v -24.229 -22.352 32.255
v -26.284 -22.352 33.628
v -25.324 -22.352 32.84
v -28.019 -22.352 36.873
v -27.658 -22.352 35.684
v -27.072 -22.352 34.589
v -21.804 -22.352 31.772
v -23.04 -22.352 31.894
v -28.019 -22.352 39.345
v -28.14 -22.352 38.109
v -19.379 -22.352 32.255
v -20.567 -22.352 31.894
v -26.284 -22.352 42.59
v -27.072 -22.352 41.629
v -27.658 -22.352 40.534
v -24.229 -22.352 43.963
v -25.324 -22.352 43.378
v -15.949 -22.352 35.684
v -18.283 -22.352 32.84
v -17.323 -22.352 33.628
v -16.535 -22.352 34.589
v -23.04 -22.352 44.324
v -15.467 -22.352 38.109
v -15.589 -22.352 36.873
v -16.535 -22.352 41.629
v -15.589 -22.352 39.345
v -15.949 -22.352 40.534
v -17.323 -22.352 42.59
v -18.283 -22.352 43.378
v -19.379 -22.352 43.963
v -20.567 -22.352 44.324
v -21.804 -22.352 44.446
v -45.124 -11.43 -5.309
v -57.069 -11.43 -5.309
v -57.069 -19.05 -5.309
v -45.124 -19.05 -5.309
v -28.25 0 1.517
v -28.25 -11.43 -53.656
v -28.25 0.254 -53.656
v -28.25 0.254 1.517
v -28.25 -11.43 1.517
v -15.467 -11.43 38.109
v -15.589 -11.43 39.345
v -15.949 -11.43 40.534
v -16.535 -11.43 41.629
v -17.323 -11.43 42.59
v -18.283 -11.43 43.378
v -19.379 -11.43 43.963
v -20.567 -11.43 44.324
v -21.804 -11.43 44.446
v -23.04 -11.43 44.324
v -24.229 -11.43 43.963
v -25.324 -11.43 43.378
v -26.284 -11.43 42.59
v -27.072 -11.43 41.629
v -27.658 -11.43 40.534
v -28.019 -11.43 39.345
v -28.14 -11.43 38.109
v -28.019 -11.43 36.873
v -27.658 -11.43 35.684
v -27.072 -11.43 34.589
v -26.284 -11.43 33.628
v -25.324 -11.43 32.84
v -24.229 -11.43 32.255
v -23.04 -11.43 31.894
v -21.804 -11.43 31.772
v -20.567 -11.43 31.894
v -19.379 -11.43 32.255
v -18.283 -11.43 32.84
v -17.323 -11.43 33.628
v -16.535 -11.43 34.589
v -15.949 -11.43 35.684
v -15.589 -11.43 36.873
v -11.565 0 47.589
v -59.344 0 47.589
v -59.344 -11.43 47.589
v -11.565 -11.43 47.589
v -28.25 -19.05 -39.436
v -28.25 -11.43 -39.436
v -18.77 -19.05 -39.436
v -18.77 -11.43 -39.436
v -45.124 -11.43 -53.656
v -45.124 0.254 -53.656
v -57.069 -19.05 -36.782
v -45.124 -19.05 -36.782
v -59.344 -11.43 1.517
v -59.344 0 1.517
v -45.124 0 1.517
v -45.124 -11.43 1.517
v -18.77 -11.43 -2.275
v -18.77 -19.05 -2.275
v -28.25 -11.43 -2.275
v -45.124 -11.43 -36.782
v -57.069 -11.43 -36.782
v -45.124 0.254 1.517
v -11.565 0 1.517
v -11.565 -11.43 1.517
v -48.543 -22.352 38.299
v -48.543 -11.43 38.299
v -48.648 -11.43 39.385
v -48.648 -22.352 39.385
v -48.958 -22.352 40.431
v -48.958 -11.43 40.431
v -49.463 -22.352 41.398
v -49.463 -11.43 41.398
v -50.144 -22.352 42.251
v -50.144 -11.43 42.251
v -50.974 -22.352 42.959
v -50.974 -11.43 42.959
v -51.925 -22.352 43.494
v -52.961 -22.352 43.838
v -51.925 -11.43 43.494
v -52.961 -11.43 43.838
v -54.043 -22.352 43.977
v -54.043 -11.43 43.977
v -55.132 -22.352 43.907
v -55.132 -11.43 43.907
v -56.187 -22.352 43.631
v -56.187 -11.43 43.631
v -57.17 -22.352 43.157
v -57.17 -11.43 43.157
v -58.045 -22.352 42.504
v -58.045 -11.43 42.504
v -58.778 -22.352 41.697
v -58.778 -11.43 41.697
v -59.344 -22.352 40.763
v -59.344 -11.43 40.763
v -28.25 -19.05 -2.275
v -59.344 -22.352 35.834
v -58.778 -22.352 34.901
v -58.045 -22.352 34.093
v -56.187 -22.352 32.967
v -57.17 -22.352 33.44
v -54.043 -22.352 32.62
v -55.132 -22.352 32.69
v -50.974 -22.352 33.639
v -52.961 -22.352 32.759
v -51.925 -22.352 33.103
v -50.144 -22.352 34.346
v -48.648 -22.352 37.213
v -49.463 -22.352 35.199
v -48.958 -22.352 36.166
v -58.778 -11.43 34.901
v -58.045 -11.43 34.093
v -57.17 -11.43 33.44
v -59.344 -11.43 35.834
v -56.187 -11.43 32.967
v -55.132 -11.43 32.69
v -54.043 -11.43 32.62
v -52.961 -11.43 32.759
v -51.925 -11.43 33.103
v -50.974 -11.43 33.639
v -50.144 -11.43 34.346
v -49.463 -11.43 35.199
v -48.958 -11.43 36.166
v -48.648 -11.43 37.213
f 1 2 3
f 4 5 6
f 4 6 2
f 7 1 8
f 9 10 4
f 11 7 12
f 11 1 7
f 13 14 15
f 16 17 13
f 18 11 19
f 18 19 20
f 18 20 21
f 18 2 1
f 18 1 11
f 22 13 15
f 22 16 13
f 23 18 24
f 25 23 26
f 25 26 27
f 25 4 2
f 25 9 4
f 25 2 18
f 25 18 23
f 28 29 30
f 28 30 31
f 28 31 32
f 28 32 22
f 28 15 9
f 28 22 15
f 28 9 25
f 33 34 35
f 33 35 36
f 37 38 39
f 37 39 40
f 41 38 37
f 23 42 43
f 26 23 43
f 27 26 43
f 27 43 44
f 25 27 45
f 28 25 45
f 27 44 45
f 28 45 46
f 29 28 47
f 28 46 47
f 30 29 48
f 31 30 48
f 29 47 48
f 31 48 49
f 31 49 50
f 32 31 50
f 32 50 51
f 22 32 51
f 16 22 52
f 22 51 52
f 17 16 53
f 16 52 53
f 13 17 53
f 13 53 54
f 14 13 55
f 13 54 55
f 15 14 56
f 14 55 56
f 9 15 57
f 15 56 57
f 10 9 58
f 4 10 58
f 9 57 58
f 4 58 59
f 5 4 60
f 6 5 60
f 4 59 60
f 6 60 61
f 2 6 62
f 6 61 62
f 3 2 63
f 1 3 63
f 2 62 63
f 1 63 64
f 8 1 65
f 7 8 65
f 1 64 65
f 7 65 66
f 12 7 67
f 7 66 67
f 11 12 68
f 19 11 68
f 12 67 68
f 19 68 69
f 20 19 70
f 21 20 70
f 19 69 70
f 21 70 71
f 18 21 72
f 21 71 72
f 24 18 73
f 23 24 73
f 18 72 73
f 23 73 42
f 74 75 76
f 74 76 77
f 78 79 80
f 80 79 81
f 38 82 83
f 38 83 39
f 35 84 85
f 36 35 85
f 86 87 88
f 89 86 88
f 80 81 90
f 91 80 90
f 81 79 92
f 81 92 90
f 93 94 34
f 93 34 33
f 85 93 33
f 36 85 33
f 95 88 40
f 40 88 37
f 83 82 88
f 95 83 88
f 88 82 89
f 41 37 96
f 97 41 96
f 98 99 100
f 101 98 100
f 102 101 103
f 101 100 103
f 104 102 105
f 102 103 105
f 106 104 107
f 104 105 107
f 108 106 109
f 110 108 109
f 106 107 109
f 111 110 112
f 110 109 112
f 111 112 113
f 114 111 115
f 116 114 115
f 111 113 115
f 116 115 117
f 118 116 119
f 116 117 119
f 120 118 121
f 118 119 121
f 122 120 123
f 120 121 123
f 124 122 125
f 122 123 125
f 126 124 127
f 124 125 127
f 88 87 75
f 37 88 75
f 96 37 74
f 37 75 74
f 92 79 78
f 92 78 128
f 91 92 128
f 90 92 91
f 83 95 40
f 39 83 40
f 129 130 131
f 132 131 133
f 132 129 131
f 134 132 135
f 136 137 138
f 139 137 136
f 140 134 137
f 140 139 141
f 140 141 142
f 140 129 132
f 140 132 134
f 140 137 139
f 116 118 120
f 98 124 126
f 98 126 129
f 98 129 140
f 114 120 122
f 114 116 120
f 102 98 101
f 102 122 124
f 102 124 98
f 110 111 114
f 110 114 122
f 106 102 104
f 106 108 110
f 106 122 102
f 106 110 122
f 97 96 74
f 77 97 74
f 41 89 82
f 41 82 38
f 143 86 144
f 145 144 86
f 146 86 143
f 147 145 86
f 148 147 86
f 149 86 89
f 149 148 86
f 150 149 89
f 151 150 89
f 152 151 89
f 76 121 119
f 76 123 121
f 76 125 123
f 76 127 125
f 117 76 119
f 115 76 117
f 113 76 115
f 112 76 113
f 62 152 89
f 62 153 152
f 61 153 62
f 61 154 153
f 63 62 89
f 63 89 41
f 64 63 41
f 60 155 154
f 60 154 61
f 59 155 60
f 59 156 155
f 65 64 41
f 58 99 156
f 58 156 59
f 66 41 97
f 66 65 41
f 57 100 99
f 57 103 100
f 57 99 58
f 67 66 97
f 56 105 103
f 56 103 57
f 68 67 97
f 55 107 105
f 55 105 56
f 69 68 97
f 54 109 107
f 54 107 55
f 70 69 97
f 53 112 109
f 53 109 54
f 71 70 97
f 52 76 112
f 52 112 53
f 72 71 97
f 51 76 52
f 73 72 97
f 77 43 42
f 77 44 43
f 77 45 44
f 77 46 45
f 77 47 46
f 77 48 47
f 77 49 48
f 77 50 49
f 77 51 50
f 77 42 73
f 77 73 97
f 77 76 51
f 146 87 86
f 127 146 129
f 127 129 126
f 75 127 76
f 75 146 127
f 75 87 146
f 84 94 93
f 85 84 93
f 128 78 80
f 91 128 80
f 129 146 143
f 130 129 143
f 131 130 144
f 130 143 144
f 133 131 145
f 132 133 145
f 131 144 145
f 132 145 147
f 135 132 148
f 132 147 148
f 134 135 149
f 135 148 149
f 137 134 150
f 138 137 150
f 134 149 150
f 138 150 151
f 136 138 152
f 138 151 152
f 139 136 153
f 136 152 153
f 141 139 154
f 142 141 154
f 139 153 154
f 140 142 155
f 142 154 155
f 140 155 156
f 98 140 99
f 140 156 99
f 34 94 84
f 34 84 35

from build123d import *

# Parameters (mm, degrees)
F0_W     = 47.7784844115
F0_H     = 46.0721075069
F1_DEPTH = 11.43
F2_R     = 6.3366292435
F3_DEPTH = 10.922
F4_W     = 16.8741475791
F4_H     = 55.1727705169
F5_DEPTH = 11.684
F6_W     = 11.9446180761
F6_H     = 31.4731267281
F7_DEPTH = 7.62
F6_W_2   = 9.4798579812
F6_H_2   = 37.1610440779


with BuildPart() as f1:
    # F0 (on Front) → F1 (new body)
    with BuildSketch(Plane.XZ):
        with Locations((-35.4546695016, 24.552831077)):
            Rectangle(F0_W, F0_H)
    extrude(amount=F1_DEPTH)

    # F2 (on face) → F3 (join)
    with BuildSketch(Plane.XZ.offset(11.43)):
        with Locations((-21.8036733568, 38.1090268493)):
            Circle(F2_R)
        with BuildLine():
            ThreePointArc((-59.3439117074, 35.8338771532), (-52.9607297218, 32.7594376902), (-48.5431977535, 38.298625499))
            ThreePointArc((-48.5431977535, 38.298625499), (-52.9607297218, 43.8378133078), (-59.3439117074, 40.7633738449))
            Line((-59.3439117074, 40.7633738449), (-59.3439117074, 35.8338771532))
        make_face()
    extrude(amount=F3_DEPTH)

    # F4 (on face) → F5 (join)
    with BuildSketch(Plane.XZ.offset(11.43)):
        with Locations((-36.6870509461, -26.0696079349)):
            Rectangle(F4_W, F4_H)
    extrude(amount=-F5_DEPTH)


with BuildPart() as f7:
    # F6 (on face) → F7 (new body)
    with BuildSketch(Plane.XZ.offset(11.43)):
        with Locations((-51.0964337736, -21.0452841129)):
            Rectangle(F6_W, F6_H)
    extrude(amount=F7_DEPTH)


with BuildPart() as f7b:
    # F6 (on face) → F7, piece 2 (new body)
    with BuildSketch(Plane.XZ.offset(11.43)):
        with Locations((-23.5100481659, -20.8556879079)):
            Rectangle(F6_W_2, F6_H_2)
    extrude(amount=F7_DEPTH)


solid = Compound([f1.part, f7.part, f7b.part])
